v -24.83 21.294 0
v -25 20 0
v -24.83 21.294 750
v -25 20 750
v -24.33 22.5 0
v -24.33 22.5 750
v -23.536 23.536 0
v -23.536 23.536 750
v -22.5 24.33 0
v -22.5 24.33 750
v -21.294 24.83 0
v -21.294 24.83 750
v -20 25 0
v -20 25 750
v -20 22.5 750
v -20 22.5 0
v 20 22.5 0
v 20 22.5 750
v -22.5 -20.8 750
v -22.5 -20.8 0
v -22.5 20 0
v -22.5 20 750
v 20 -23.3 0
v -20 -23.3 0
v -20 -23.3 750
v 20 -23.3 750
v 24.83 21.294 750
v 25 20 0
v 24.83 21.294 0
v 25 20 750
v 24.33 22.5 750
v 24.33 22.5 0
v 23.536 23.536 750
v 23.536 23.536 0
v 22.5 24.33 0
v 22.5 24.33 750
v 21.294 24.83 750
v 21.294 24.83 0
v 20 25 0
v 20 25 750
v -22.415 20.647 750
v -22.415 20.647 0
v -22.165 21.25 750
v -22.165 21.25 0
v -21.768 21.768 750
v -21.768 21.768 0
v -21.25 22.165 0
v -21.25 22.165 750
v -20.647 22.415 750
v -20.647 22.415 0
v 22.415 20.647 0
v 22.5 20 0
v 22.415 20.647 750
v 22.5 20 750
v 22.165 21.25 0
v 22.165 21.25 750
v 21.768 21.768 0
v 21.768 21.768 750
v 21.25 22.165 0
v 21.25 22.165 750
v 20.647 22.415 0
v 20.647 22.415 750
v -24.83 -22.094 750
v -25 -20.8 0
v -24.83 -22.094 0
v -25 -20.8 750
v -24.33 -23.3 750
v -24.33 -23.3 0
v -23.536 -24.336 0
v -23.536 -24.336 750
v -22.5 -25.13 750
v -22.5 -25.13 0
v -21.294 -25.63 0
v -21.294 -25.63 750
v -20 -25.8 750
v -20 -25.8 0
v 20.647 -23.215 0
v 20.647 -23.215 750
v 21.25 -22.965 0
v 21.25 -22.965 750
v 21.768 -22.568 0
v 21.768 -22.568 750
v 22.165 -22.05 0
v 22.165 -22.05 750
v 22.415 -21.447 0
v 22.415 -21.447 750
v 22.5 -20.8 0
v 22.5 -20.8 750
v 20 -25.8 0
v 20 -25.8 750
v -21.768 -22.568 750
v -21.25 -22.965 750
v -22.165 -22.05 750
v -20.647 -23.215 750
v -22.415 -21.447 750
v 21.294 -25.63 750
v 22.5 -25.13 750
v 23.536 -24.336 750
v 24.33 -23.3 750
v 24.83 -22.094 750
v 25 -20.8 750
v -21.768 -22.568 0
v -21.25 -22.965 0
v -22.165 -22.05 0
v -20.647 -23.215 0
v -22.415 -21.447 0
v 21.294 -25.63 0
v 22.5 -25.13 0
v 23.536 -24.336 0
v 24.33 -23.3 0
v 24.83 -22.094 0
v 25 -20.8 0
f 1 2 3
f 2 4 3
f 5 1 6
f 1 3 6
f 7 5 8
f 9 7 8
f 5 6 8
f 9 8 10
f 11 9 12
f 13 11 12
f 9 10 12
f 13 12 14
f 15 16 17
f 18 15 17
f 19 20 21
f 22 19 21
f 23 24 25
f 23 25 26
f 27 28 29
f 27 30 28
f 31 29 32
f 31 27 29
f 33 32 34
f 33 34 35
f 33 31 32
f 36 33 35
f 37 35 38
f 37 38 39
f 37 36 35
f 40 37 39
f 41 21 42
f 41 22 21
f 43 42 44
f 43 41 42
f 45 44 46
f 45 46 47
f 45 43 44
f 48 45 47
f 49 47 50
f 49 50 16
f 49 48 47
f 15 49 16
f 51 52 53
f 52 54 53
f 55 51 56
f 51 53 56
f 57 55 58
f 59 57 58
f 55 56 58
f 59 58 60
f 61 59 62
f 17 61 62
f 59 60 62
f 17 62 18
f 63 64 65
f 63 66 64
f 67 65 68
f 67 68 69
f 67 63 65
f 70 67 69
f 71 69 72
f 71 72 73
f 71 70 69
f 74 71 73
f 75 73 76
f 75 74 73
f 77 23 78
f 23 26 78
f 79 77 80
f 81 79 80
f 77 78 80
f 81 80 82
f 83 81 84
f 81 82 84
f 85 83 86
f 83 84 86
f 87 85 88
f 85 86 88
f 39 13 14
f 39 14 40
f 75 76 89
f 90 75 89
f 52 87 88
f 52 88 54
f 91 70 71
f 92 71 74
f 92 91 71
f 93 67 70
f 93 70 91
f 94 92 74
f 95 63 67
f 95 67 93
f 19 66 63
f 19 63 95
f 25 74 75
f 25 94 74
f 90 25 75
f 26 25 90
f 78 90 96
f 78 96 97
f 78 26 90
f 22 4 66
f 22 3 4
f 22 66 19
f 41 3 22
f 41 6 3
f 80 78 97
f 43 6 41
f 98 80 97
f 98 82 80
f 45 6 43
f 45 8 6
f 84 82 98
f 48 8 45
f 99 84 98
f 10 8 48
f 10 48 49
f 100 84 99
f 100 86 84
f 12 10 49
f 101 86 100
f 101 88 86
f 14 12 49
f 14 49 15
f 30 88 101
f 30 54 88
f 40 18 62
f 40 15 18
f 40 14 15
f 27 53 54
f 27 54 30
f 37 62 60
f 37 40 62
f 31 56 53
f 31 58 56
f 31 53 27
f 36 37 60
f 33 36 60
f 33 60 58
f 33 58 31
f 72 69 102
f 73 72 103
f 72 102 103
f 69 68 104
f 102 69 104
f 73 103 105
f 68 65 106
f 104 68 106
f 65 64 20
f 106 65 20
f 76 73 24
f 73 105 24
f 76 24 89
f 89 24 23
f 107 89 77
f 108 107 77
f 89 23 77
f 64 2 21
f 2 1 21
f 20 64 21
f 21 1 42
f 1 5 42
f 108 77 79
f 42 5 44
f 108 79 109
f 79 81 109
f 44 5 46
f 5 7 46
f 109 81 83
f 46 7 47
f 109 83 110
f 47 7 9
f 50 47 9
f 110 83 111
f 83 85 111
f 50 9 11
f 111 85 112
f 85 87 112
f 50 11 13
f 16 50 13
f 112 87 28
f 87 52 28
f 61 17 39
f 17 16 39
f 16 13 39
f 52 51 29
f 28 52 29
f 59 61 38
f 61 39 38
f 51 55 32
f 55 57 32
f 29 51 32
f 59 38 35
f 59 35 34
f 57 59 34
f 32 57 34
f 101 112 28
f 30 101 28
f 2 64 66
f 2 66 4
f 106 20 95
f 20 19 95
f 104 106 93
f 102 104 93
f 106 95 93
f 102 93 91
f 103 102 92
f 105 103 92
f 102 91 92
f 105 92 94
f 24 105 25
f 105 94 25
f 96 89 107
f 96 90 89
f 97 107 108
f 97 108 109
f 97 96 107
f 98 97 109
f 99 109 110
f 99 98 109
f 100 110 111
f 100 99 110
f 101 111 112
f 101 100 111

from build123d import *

# Parameters (mm, degrees)
F0_W     = 50
F0_H     = 50.8
F1_DEPTH = 750
F2_R     = 5
F3_T     = -2.5


with BuildPart() as f1:
    # F0 (on Top) → F1 (new body)
    with BuildSketch(Plane.XY):
        with Locations((0, -0.4)):
            Rectangle(F0_W, F0_H)
    extrude(amount=F1_DEPTH)

    # F2
    f2_edges = [f1.edges().sort_by_distance(p)[0] for p in [
        (25, 25, 375),
        (25, -25.8, 375),
        (-25, 25, 375),
        (-25, -25.8, 375),
    ]]
    fillet(f2_edges, radius=F2_R)

    # F3
    f3_openings = [f1.faces().sort_by_distance(p)[0] for p in [
        (0, -0.4, 750),
        (0, -0.4, 0),
    ]]
    offset(amount=F3_T, openings=f3_openings)


solid = f1.part
